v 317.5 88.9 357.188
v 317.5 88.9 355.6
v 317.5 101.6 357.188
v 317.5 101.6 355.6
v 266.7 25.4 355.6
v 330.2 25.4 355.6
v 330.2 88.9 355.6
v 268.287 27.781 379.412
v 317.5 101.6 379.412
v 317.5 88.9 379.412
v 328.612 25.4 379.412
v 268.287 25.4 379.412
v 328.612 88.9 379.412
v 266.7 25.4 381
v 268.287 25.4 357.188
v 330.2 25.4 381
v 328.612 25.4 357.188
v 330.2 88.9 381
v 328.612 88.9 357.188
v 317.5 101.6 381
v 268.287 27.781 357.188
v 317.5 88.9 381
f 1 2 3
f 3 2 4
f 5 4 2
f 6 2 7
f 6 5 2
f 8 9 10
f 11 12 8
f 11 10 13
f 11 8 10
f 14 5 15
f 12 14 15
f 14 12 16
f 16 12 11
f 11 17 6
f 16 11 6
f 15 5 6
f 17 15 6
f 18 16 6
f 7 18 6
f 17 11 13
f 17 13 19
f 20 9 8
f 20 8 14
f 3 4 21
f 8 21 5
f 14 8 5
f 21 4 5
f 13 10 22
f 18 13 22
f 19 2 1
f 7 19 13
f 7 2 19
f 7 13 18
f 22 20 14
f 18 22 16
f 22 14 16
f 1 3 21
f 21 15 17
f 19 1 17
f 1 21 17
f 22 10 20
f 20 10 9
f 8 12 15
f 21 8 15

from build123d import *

# Parameters (mm, degrees)
SKETCH1_W           = 63.5
SKETCH1_H           = 25.4
SKETCH1_W_2         = 60.325
SKETCH1_H_2         = 22.225
BOSS_EXTRUDE1_DEPTH = 76.2
SKETCH2_W           = 12.7
SKETCH2_H           = 12.7
CUT_EXTRUDE1_DEPTH  = 515.310800975


with BuildPart() as part:
    # Sketch1 → Boss-Extrude1 (new body)
    with BuildSketch(Plane(origin=(0, 25.4, 0), x_dir=(1, 0, 0), z_dir=(0, 1, 0))):
        with Locations((298.45, -368.3)):
            Rectangle(SKETCH1_W, SKETCH1_H)
        with Locations((298.45, -368.3)):
            Rectangle(SKETCH1_W_2, SKETCH1_H_2, mode=Mode.SUBTRACT)
    extrude(amount=BOSS_EXTRUDE1_DEPTH)

    # Sketch2 → Cut-Extrude1 (cut, through all)
    with BuildSketch(Plane.XY):
        Polygon((266.7, 101.6), (317.5, 101.6), (266.7, 25.4), align=None)
        with Locations((323.85, 95.25)):
            Rectangle(SKETCH2_W, SKETCH2_H)
    extrude(amount=CUT_EXTRUDE1_DEPTH, mode=Mode.SUBTRACT)


solid = part.part
